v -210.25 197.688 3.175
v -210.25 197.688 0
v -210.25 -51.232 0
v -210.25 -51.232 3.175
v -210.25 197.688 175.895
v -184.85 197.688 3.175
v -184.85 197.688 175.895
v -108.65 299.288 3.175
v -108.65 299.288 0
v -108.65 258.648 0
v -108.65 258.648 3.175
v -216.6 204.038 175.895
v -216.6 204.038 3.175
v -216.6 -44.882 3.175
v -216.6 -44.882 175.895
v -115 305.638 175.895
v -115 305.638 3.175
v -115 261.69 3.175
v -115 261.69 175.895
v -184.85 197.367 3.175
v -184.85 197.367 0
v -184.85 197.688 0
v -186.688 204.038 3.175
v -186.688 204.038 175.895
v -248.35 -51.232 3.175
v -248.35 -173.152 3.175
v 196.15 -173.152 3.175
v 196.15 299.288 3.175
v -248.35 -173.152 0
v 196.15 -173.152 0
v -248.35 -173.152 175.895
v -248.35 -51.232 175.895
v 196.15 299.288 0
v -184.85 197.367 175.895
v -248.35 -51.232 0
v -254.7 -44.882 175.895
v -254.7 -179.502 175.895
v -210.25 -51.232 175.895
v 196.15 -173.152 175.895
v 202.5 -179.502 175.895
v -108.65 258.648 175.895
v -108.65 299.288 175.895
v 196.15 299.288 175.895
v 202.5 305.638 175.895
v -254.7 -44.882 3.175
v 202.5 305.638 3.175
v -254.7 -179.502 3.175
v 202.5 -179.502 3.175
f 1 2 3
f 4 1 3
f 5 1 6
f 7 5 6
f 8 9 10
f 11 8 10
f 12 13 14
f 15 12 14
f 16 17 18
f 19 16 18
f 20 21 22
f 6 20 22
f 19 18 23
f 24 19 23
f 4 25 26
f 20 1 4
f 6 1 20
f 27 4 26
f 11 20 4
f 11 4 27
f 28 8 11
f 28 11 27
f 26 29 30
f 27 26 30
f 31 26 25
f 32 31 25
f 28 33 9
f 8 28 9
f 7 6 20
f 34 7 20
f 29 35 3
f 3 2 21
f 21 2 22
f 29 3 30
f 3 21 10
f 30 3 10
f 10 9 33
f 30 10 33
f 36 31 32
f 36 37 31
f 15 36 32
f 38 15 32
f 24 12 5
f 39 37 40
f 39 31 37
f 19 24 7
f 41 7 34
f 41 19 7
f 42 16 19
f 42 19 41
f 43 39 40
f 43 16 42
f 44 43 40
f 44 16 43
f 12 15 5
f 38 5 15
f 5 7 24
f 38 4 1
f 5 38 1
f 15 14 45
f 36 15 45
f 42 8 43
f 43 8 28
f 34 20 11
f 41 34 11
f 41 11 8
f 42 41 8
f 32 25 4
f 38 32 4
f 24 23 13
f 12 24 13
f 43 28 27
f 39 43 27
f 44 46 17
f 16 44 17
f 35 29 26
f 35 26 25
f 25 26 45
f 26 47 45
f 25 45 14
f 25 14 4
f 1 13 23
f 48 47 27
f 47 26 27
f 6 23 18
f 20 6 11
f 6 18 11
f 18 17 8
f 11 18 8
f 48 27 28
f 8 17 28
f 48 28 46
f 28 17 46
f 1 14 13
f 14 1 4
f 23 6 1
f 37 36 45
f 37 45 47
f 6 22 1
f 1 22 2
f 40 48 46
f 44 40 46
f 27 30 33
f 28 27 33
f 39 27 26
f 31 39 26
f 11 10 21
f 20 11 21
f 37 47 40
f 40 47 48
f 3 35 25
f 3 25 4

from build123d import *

# Parameters (mm, degrees)
F0_W     = 38.1
F0_H     = 121.92
F0_W_2   = 12.7
F0_H_2   = 177.8
F1_DEPTH = 3.175
F3_DEPTH = 172.72


with BuildPart() as f1:
    # F0 (on Top) → F1 (new body)
    with BuildSketch(Plane.XY):
        Polygon((-210.250471, -173.151603), (196.149529, -173.151603), (196.149529, 299.288397), (-108.650471, 299.288397), (-108.650471, 258.648397), (-184.850471, 197.367145), (-184.850471, 197.688397), (-210.250471, 197.688397), (-210.250471, 149.273349), (-197.550471, 149.273349), (-197.550471, -28.526651), (-210.250471, -28.526651), (-210.250471, -51.231603), align=None)
        with Locations((-229.300471, -112.191603)):
            Rectangle(F0_W, F0_H)
        with Locations((-203.900471, 60.373349)):
            Rectangle(F0_W_2, F0_H_2)
    extrude(amount=F1_DEPTH)


with BuildPart() as f3:
    # F2 (on face) → F3 (new body)
    with BuildSketch(Plane.XY.offset(3.175)):
        Polygon((202.499529, 305.638397), (-115.000471, 305.638397), (-115.000471, 261.690344), (-186.687622, 204.038397), (-216.600471, 204.038397), (-216.600471, -44.881603), (-254.700471, -44.881603), (-254.700471, -179.501603), (202.499529, -179.501603), align=None)
        Polygon((-210.250471, -51.231603), (-210.250471, -31.194258), (-210.250471, 172.288397), (-210.250471, 197.688397), (-184.850471, 197.688397), (-184.850471, 197.367145), (-108.650471, 258.648397), (-108.650471, 299.288397), (196.149529, 299.288397), (196.149529, -173.151603), (-248.350471, -173.151603), (-248.350471, -51.231603), align=None, mode=Mode.SUBTRACT)
    extrude(amount=F3_DEPTH)


solid = Compound([f1.part, f3.part])
